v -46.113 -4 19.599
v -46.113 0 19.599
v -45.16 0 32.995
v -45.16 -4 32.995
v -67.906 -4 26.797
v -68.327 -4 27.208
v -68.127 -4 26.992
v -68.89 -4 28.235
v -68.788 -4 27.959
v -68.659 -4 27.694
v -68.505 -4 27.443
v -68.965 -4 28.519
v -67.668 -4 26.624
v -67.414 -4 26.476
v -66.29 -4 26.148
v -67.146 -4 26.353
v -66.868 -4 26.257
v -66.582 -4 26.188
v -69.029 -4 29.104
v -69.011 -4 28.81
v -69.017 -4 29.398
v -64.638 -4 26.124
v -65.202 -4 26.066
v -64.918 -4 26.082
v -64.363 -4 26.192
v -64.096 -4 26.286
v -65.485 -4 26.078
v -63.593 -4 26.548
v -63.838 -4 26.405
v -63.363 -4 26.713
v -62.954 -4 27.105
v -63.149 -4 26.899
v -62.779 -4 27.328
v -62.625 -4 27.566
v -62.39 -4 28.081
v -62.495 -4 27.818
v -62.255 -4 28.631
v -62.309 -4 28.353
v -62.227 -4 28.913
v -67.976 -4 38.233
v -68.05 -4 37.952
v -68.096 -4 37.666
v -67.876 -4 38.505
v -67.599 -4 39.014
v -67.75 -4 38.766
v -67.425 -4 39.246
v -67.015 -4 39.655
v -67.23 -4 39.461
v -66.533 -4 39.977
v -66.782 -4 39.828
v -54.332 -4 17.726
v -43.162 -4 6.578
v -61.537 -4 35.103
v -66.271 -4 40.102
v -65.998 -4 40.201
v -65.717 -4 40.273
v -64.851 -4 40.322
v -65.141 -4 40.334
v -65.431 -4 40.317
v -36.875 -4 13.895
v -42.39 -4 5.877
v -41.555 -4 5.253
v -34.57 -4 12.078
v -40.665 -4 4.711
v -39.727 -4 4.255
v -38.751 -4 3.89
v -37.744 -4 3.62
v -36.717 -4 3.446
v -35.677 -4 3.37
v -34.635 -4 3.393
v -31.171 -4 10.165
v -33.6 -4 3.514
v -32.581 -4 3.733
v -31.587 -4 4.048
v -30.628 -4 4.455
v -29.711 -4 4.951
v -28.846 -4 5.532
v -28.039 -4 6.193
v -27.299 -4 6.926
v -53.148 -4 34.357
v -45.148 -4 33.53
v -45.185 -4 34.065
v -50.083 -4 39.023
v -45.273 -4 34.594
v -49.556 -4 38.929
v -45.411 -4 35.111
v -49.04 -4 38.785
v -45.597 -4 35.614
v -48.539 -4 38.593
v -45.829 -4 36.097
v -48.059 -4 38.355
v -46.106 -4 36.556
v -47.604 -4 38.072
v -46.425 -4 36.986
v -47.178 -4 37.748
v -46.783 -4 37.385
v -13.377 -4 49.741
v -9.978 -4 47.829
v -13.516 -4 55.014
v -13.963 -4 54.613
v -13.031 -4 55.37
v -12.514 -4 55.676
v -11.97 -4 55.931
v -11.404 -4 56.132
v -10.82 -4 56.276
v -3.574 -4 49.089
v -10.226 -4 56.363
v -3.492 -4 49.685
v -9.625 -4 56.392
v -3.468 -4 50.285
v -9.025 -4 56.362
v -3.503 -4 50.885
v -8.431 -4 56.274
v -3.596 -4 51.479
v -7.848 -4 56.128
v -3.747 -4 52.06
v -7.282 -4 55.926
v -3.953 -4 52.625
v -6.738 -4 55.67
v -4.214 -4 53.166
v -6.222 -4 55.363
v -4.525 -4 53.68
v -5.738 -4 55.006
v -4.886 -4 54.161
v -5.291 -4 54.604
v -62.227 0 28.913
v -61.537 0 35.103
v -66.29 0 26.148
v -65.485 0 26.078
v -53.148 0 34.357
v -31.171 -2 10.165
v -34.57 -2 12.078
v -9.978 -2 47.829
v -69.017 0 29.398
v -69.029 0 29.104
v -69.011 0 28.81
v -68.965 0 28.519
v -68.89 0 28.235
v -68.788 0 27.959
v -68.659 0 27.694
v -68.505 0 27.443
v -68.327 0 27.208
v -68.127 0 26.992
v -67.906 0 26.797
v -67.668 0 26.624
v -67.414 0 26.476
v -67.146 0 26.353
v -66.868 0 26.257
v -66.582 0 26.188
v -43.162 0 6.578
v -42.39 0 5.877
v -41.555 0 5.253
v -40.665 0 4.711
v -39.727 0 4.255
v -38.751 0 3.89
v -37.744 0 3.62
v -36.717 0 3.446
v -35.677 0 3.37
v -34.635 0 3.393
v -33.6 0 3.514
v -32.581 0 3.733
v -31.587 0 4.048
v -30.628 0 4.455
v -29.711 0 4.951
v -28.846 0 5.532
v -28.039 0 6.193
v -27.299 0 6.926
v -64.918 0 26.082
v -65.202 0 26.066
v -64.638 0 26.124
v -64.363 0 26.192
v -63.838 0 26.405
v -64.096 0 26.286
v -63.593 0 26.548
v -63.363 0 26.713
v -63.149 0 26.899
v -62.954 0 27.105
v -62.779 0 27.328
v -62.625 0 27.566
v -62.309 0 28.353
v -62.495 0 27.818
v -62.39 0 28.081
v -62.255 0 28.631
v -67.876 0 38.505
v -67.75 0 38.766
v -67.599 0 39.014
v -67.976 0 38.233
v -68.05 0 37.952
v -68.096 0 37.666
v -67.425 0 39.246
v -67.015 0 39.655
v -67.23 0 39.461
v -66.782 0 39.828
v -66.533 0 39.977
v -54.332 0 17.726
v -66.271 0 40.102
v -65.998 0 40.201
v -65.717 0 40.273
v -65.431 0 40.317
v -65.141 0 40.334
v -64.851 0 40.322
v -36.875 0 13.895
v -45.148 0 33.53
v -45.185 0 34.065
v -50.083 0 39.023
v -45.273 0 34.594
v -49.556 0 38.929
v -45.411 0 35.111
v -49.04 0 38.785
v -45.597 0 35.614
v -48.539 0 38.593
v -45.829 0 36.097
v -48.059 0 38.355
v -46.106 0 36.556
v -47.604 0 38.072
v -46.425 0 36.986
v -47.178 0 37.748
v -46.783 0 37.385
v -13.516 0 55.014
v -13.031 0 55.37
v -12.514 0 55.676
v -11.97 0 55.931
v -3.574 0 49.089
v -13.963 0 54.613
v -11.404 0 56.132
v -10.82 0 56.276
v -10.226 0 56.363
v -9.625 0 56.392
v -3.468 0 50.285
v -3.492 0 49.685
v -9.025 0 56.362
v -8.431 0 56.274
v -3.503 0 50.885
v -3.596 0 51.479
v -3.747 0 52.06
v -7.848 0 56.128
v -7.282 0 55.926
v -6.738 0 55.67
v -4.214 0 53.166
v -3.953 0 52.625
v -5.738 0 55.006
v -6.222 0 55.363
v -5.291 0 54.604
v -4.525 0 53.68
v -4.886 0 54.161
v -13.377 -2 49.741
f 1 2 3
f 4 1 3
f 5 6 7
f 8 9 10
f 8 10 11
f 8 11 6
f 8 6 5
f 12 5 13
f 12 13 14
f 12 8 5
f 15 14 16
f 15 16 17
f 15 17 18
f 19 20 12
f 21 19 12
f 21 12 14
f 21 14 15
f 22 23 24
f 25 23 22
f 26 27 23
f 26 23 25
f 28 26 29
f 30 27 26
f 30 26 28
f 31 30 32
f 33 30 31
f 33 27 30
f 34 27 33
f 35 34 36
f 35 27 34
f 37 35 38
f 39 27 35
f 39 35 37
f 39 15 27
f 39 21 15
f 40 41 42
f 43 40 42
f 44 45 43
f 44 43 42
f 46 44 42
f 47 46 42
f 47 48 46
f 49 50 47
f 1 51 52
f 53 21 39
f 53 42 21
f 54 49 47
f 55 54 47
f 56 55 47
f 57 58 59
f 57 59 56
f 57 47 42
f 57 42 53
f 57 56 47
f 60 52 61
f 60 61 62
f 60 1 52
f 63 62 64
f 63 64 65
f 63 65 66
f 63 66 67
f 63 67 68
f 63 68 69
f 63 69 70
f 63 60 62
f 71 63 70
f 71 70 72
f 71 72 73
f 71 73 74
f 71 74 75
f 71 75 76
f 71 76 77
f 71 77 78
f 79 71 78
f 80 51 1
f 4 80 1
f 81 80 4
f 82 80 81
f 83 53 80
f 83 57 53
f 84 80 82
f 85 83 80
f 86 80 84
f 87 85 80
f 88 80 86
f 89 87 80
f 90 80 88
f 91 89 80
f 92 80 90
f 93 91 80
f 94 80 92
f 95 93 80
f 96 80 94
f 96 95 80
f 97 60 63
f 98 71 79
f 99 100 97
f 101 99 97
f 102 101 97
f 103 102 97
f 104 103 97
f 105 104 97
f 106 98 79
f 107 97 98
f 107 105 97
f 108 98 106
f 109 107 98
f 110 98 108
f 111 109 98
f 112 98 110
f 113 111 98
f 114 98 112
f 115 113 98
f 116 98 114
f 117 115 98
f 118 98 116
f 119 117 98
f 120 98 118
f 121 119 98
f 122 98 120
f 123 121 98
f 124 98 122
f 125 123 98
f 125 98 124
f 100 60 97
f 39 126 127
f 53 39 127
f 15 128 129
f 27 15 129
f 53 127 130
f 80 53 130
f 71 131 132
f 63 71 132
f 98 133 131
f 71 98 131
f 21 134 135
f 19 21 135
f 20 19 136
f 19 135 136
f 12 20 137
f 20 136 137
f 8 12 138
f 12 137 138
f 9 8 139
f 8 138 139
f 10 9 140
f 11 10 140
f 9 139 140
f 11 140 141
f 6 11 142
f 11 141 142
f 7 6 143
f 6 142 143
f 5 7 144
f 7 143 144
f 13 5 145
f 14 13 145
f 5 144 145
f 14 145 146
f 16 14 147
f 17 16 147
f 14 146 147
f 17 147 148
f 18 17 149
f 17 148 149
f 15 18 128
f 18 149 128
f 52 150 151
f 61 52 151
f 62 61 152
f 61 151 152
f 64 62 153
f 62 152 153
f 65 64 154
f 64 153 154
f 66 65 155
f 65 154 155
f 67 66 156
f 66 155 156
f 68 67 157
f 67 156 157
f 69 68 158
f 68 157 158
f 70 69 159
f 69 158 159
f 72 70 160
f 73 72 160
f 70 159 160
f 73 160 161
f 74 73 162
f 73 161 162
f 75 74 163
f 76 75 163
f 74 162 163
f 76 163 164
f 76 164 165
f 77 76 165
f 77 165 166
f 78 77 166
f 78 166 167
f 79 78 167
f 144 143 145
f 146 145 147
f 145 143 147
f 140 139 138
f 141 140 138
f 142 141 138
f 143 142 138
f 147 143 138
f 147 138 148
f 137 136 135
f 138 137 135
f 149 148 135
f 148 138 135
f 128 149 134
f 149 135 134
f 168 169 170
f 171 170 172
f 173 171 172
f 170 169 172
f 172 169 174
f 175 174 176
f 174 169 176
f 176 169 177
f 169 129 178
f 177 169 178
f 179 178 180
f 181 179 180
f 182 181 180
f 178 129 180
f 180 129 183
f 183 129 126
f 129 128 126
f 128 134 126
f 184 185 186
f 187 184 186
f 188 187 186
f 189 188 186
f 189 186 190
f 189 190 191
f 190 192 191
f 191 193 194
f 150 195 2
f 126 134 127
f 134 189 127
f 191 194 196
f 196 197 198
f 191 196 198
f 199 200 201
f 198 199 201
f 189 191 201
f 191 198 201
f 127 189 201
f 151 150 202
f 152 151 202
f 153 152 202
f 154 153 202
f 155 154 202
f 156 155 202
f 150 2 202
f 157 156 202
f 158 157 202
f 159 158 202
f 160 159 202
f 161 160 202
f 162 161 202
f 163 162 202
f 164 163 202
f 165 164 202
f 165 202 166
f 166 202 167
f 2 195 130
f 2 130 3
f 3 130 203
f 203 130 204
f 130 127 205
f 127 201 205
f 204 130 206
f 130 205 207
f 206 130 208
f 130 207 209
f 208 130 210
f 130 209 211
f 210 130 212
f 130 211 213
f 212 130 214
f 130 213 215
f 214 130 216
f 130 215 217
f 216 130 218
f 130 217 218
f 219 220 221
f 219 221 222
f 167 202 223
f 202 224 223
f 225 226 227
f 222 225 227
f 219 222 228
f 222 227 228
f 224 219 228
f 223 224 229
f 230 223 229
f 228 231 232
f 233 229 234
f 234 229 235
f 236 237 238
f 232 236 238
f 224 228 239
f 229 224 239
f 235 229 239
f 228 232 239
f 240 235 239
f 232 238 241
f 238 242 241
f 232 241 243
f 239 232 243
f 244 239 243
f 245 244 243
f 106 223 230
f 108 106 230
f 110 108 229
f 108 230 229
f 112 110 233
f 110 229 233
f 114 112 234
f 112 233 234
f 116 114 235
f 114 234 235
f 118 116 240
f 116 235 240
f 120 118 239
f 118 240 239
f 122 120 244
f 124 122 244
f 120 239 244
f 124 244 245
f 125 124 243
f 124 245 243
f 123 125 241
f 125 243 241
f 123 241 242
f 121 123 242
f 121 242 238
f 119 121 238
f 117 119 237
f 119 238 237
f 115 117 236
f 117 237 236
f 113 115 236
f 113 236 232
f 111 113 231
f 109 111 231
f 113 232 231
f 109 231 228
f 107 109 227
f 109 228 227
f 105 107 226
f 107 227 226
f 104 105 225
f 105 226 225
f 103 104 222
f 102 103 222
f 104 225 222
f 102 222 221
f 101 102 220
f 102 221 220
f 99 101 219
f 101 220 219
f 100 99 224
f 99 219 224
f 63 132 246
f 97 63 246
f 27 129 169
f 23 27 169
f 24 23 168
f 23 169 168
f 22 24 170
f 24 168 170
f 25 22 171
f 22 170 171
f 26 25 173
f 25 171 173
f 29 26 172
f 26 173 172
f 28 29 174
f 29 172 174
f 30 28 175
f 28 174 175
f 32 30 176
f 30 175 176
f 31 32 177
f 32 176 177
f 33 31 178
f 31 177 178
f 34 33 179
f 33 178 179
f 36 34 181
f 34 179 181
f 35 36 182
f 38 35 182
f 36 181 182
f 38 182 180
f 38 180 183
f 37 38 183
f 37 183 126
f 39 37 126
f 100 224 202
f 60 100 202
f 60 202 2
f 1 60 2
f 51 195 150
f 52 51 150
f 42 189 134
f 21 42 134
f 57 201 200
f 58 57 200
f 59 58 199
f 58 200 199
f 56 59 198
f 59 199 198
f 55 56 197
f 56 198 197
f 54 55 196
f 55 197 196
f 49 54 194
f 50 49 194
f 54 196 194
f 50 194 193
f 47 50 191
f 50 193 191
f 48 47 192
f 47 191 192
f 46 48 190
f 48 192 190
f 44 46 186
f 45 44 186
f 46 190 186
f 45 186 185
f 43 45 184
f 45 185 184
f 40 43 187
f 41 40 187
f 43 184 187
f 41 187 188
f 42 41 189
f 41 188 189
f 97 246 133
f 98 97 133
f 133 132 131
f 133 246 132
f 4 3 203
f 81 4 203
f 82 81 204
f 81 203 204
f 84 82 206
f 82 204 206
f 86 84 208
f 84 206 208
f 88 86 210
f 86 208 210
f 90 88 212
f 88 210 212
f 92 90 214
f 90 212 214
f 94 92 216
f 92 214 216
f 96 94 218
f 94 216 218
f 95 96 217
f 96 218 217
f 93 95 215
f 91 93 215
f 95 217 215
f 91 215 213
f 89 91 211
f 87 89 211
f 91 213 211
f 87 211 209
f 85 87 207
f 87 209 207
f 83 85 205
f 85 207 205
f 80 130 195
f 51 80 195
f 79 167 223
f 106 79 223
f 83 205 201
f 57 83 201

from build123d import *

# Parameters (mm, degrees)
F1_DEPTH = 4
F2_DEPTH = 2


# Not quite as in the source:
# - a feature names something its author has since deleted; it is built from what else it names


with BuildPart() as f1:
    # F0 (on Front) → F1 (new body)
    with BuildSketch(Plane.XZ):
        with BuildLine():
            ThreePointArc((-69.017292897, 29.3982457694), (-68.3268421331, 27.2084157133), (-66.290176034, 26.1481944472))
            Line((-66.290176034, 26.1481944472), (-65.4847666663, 26.0777302572))
            ThreePointArc((-65.4847666663, 26.0777302572), (-63.2535898646, 26.8035186892), (-62.2272009721, 28.913363378))
            Line((-62.2272009721, 28.913363378), (-61.5372568785, 35.1033145465))
            Line((-61.5372568785, 35.1033145465), (-53.1481667688, 34.3565562926))
            Line((-53.1481667688, 34.3565562926), (-54.3320948451, 17.7259296179))
            Line((-54.3320948451, 17.7259296179), (-43.1615771204, 6.577645293))
            ThreePointArc((-43.1615771204, 6.577645293), (-35.1559477392, 3.3688057895), (-27.2990026255, 6.9262158348))
            Line((-27.2990026255, 6.9262158348), (-3.5743886341, 49.0892314075))
            ThreePointArc((-3.5743886341, 49.0892314075), (-6.738115065, 55.6702900526), (-13.9632260986, 54.6132808892))
            Line((-13.9632260986, 54.6132808892), (-36.8751008064, 13.8946529478))
            Line((-36.8751008064, 13.8946529478), (-46.112828888, 19.5994470268))
            Line((-46.112828888, 19.5994470268), (-45.1602484403, 32.9947581421))
            ThreePointArc((-45.1602484403, 32.9947581421), (-46.4251891271, 36.9862585641), (-50.0833280385, 39.0234552324))
            Line((-50.0833280385, 39.0234552324), (-64.8513762012, 40.3222609912))
            ThreePointArc((-64.8513762012, 40.3222609912), (-67.0146267862, 39.6550864105), (-68.0957389782, 37.666124007))
            Line((-68.0957389782, 37.666124007), (-69.017292897, 29.3982457694))
        make_face()
        Polygon((-9.9778777986, 47.8288231225), (-31.1708185564, 10.1650579072), (-34.5696903843, 12.0775615796), (-13.3767496278, 49.7413267956), align=None, mode=Mode.SUBTRACT)
    extrude(amount=F1_DEPTH)

    # F0 (on Front) → F2 (join)
    with BuildSketch(Plane.XZ):
        Polygon((-34.5696903843, 12.0775615796), (-31.1708185564, 10.1650579072), (-9.9778777986, 47.8288231225), (-13.3767496278, 49.7413267956), align=None)
    extrude(amount=F2_DEPTH)


solid = f1.part
